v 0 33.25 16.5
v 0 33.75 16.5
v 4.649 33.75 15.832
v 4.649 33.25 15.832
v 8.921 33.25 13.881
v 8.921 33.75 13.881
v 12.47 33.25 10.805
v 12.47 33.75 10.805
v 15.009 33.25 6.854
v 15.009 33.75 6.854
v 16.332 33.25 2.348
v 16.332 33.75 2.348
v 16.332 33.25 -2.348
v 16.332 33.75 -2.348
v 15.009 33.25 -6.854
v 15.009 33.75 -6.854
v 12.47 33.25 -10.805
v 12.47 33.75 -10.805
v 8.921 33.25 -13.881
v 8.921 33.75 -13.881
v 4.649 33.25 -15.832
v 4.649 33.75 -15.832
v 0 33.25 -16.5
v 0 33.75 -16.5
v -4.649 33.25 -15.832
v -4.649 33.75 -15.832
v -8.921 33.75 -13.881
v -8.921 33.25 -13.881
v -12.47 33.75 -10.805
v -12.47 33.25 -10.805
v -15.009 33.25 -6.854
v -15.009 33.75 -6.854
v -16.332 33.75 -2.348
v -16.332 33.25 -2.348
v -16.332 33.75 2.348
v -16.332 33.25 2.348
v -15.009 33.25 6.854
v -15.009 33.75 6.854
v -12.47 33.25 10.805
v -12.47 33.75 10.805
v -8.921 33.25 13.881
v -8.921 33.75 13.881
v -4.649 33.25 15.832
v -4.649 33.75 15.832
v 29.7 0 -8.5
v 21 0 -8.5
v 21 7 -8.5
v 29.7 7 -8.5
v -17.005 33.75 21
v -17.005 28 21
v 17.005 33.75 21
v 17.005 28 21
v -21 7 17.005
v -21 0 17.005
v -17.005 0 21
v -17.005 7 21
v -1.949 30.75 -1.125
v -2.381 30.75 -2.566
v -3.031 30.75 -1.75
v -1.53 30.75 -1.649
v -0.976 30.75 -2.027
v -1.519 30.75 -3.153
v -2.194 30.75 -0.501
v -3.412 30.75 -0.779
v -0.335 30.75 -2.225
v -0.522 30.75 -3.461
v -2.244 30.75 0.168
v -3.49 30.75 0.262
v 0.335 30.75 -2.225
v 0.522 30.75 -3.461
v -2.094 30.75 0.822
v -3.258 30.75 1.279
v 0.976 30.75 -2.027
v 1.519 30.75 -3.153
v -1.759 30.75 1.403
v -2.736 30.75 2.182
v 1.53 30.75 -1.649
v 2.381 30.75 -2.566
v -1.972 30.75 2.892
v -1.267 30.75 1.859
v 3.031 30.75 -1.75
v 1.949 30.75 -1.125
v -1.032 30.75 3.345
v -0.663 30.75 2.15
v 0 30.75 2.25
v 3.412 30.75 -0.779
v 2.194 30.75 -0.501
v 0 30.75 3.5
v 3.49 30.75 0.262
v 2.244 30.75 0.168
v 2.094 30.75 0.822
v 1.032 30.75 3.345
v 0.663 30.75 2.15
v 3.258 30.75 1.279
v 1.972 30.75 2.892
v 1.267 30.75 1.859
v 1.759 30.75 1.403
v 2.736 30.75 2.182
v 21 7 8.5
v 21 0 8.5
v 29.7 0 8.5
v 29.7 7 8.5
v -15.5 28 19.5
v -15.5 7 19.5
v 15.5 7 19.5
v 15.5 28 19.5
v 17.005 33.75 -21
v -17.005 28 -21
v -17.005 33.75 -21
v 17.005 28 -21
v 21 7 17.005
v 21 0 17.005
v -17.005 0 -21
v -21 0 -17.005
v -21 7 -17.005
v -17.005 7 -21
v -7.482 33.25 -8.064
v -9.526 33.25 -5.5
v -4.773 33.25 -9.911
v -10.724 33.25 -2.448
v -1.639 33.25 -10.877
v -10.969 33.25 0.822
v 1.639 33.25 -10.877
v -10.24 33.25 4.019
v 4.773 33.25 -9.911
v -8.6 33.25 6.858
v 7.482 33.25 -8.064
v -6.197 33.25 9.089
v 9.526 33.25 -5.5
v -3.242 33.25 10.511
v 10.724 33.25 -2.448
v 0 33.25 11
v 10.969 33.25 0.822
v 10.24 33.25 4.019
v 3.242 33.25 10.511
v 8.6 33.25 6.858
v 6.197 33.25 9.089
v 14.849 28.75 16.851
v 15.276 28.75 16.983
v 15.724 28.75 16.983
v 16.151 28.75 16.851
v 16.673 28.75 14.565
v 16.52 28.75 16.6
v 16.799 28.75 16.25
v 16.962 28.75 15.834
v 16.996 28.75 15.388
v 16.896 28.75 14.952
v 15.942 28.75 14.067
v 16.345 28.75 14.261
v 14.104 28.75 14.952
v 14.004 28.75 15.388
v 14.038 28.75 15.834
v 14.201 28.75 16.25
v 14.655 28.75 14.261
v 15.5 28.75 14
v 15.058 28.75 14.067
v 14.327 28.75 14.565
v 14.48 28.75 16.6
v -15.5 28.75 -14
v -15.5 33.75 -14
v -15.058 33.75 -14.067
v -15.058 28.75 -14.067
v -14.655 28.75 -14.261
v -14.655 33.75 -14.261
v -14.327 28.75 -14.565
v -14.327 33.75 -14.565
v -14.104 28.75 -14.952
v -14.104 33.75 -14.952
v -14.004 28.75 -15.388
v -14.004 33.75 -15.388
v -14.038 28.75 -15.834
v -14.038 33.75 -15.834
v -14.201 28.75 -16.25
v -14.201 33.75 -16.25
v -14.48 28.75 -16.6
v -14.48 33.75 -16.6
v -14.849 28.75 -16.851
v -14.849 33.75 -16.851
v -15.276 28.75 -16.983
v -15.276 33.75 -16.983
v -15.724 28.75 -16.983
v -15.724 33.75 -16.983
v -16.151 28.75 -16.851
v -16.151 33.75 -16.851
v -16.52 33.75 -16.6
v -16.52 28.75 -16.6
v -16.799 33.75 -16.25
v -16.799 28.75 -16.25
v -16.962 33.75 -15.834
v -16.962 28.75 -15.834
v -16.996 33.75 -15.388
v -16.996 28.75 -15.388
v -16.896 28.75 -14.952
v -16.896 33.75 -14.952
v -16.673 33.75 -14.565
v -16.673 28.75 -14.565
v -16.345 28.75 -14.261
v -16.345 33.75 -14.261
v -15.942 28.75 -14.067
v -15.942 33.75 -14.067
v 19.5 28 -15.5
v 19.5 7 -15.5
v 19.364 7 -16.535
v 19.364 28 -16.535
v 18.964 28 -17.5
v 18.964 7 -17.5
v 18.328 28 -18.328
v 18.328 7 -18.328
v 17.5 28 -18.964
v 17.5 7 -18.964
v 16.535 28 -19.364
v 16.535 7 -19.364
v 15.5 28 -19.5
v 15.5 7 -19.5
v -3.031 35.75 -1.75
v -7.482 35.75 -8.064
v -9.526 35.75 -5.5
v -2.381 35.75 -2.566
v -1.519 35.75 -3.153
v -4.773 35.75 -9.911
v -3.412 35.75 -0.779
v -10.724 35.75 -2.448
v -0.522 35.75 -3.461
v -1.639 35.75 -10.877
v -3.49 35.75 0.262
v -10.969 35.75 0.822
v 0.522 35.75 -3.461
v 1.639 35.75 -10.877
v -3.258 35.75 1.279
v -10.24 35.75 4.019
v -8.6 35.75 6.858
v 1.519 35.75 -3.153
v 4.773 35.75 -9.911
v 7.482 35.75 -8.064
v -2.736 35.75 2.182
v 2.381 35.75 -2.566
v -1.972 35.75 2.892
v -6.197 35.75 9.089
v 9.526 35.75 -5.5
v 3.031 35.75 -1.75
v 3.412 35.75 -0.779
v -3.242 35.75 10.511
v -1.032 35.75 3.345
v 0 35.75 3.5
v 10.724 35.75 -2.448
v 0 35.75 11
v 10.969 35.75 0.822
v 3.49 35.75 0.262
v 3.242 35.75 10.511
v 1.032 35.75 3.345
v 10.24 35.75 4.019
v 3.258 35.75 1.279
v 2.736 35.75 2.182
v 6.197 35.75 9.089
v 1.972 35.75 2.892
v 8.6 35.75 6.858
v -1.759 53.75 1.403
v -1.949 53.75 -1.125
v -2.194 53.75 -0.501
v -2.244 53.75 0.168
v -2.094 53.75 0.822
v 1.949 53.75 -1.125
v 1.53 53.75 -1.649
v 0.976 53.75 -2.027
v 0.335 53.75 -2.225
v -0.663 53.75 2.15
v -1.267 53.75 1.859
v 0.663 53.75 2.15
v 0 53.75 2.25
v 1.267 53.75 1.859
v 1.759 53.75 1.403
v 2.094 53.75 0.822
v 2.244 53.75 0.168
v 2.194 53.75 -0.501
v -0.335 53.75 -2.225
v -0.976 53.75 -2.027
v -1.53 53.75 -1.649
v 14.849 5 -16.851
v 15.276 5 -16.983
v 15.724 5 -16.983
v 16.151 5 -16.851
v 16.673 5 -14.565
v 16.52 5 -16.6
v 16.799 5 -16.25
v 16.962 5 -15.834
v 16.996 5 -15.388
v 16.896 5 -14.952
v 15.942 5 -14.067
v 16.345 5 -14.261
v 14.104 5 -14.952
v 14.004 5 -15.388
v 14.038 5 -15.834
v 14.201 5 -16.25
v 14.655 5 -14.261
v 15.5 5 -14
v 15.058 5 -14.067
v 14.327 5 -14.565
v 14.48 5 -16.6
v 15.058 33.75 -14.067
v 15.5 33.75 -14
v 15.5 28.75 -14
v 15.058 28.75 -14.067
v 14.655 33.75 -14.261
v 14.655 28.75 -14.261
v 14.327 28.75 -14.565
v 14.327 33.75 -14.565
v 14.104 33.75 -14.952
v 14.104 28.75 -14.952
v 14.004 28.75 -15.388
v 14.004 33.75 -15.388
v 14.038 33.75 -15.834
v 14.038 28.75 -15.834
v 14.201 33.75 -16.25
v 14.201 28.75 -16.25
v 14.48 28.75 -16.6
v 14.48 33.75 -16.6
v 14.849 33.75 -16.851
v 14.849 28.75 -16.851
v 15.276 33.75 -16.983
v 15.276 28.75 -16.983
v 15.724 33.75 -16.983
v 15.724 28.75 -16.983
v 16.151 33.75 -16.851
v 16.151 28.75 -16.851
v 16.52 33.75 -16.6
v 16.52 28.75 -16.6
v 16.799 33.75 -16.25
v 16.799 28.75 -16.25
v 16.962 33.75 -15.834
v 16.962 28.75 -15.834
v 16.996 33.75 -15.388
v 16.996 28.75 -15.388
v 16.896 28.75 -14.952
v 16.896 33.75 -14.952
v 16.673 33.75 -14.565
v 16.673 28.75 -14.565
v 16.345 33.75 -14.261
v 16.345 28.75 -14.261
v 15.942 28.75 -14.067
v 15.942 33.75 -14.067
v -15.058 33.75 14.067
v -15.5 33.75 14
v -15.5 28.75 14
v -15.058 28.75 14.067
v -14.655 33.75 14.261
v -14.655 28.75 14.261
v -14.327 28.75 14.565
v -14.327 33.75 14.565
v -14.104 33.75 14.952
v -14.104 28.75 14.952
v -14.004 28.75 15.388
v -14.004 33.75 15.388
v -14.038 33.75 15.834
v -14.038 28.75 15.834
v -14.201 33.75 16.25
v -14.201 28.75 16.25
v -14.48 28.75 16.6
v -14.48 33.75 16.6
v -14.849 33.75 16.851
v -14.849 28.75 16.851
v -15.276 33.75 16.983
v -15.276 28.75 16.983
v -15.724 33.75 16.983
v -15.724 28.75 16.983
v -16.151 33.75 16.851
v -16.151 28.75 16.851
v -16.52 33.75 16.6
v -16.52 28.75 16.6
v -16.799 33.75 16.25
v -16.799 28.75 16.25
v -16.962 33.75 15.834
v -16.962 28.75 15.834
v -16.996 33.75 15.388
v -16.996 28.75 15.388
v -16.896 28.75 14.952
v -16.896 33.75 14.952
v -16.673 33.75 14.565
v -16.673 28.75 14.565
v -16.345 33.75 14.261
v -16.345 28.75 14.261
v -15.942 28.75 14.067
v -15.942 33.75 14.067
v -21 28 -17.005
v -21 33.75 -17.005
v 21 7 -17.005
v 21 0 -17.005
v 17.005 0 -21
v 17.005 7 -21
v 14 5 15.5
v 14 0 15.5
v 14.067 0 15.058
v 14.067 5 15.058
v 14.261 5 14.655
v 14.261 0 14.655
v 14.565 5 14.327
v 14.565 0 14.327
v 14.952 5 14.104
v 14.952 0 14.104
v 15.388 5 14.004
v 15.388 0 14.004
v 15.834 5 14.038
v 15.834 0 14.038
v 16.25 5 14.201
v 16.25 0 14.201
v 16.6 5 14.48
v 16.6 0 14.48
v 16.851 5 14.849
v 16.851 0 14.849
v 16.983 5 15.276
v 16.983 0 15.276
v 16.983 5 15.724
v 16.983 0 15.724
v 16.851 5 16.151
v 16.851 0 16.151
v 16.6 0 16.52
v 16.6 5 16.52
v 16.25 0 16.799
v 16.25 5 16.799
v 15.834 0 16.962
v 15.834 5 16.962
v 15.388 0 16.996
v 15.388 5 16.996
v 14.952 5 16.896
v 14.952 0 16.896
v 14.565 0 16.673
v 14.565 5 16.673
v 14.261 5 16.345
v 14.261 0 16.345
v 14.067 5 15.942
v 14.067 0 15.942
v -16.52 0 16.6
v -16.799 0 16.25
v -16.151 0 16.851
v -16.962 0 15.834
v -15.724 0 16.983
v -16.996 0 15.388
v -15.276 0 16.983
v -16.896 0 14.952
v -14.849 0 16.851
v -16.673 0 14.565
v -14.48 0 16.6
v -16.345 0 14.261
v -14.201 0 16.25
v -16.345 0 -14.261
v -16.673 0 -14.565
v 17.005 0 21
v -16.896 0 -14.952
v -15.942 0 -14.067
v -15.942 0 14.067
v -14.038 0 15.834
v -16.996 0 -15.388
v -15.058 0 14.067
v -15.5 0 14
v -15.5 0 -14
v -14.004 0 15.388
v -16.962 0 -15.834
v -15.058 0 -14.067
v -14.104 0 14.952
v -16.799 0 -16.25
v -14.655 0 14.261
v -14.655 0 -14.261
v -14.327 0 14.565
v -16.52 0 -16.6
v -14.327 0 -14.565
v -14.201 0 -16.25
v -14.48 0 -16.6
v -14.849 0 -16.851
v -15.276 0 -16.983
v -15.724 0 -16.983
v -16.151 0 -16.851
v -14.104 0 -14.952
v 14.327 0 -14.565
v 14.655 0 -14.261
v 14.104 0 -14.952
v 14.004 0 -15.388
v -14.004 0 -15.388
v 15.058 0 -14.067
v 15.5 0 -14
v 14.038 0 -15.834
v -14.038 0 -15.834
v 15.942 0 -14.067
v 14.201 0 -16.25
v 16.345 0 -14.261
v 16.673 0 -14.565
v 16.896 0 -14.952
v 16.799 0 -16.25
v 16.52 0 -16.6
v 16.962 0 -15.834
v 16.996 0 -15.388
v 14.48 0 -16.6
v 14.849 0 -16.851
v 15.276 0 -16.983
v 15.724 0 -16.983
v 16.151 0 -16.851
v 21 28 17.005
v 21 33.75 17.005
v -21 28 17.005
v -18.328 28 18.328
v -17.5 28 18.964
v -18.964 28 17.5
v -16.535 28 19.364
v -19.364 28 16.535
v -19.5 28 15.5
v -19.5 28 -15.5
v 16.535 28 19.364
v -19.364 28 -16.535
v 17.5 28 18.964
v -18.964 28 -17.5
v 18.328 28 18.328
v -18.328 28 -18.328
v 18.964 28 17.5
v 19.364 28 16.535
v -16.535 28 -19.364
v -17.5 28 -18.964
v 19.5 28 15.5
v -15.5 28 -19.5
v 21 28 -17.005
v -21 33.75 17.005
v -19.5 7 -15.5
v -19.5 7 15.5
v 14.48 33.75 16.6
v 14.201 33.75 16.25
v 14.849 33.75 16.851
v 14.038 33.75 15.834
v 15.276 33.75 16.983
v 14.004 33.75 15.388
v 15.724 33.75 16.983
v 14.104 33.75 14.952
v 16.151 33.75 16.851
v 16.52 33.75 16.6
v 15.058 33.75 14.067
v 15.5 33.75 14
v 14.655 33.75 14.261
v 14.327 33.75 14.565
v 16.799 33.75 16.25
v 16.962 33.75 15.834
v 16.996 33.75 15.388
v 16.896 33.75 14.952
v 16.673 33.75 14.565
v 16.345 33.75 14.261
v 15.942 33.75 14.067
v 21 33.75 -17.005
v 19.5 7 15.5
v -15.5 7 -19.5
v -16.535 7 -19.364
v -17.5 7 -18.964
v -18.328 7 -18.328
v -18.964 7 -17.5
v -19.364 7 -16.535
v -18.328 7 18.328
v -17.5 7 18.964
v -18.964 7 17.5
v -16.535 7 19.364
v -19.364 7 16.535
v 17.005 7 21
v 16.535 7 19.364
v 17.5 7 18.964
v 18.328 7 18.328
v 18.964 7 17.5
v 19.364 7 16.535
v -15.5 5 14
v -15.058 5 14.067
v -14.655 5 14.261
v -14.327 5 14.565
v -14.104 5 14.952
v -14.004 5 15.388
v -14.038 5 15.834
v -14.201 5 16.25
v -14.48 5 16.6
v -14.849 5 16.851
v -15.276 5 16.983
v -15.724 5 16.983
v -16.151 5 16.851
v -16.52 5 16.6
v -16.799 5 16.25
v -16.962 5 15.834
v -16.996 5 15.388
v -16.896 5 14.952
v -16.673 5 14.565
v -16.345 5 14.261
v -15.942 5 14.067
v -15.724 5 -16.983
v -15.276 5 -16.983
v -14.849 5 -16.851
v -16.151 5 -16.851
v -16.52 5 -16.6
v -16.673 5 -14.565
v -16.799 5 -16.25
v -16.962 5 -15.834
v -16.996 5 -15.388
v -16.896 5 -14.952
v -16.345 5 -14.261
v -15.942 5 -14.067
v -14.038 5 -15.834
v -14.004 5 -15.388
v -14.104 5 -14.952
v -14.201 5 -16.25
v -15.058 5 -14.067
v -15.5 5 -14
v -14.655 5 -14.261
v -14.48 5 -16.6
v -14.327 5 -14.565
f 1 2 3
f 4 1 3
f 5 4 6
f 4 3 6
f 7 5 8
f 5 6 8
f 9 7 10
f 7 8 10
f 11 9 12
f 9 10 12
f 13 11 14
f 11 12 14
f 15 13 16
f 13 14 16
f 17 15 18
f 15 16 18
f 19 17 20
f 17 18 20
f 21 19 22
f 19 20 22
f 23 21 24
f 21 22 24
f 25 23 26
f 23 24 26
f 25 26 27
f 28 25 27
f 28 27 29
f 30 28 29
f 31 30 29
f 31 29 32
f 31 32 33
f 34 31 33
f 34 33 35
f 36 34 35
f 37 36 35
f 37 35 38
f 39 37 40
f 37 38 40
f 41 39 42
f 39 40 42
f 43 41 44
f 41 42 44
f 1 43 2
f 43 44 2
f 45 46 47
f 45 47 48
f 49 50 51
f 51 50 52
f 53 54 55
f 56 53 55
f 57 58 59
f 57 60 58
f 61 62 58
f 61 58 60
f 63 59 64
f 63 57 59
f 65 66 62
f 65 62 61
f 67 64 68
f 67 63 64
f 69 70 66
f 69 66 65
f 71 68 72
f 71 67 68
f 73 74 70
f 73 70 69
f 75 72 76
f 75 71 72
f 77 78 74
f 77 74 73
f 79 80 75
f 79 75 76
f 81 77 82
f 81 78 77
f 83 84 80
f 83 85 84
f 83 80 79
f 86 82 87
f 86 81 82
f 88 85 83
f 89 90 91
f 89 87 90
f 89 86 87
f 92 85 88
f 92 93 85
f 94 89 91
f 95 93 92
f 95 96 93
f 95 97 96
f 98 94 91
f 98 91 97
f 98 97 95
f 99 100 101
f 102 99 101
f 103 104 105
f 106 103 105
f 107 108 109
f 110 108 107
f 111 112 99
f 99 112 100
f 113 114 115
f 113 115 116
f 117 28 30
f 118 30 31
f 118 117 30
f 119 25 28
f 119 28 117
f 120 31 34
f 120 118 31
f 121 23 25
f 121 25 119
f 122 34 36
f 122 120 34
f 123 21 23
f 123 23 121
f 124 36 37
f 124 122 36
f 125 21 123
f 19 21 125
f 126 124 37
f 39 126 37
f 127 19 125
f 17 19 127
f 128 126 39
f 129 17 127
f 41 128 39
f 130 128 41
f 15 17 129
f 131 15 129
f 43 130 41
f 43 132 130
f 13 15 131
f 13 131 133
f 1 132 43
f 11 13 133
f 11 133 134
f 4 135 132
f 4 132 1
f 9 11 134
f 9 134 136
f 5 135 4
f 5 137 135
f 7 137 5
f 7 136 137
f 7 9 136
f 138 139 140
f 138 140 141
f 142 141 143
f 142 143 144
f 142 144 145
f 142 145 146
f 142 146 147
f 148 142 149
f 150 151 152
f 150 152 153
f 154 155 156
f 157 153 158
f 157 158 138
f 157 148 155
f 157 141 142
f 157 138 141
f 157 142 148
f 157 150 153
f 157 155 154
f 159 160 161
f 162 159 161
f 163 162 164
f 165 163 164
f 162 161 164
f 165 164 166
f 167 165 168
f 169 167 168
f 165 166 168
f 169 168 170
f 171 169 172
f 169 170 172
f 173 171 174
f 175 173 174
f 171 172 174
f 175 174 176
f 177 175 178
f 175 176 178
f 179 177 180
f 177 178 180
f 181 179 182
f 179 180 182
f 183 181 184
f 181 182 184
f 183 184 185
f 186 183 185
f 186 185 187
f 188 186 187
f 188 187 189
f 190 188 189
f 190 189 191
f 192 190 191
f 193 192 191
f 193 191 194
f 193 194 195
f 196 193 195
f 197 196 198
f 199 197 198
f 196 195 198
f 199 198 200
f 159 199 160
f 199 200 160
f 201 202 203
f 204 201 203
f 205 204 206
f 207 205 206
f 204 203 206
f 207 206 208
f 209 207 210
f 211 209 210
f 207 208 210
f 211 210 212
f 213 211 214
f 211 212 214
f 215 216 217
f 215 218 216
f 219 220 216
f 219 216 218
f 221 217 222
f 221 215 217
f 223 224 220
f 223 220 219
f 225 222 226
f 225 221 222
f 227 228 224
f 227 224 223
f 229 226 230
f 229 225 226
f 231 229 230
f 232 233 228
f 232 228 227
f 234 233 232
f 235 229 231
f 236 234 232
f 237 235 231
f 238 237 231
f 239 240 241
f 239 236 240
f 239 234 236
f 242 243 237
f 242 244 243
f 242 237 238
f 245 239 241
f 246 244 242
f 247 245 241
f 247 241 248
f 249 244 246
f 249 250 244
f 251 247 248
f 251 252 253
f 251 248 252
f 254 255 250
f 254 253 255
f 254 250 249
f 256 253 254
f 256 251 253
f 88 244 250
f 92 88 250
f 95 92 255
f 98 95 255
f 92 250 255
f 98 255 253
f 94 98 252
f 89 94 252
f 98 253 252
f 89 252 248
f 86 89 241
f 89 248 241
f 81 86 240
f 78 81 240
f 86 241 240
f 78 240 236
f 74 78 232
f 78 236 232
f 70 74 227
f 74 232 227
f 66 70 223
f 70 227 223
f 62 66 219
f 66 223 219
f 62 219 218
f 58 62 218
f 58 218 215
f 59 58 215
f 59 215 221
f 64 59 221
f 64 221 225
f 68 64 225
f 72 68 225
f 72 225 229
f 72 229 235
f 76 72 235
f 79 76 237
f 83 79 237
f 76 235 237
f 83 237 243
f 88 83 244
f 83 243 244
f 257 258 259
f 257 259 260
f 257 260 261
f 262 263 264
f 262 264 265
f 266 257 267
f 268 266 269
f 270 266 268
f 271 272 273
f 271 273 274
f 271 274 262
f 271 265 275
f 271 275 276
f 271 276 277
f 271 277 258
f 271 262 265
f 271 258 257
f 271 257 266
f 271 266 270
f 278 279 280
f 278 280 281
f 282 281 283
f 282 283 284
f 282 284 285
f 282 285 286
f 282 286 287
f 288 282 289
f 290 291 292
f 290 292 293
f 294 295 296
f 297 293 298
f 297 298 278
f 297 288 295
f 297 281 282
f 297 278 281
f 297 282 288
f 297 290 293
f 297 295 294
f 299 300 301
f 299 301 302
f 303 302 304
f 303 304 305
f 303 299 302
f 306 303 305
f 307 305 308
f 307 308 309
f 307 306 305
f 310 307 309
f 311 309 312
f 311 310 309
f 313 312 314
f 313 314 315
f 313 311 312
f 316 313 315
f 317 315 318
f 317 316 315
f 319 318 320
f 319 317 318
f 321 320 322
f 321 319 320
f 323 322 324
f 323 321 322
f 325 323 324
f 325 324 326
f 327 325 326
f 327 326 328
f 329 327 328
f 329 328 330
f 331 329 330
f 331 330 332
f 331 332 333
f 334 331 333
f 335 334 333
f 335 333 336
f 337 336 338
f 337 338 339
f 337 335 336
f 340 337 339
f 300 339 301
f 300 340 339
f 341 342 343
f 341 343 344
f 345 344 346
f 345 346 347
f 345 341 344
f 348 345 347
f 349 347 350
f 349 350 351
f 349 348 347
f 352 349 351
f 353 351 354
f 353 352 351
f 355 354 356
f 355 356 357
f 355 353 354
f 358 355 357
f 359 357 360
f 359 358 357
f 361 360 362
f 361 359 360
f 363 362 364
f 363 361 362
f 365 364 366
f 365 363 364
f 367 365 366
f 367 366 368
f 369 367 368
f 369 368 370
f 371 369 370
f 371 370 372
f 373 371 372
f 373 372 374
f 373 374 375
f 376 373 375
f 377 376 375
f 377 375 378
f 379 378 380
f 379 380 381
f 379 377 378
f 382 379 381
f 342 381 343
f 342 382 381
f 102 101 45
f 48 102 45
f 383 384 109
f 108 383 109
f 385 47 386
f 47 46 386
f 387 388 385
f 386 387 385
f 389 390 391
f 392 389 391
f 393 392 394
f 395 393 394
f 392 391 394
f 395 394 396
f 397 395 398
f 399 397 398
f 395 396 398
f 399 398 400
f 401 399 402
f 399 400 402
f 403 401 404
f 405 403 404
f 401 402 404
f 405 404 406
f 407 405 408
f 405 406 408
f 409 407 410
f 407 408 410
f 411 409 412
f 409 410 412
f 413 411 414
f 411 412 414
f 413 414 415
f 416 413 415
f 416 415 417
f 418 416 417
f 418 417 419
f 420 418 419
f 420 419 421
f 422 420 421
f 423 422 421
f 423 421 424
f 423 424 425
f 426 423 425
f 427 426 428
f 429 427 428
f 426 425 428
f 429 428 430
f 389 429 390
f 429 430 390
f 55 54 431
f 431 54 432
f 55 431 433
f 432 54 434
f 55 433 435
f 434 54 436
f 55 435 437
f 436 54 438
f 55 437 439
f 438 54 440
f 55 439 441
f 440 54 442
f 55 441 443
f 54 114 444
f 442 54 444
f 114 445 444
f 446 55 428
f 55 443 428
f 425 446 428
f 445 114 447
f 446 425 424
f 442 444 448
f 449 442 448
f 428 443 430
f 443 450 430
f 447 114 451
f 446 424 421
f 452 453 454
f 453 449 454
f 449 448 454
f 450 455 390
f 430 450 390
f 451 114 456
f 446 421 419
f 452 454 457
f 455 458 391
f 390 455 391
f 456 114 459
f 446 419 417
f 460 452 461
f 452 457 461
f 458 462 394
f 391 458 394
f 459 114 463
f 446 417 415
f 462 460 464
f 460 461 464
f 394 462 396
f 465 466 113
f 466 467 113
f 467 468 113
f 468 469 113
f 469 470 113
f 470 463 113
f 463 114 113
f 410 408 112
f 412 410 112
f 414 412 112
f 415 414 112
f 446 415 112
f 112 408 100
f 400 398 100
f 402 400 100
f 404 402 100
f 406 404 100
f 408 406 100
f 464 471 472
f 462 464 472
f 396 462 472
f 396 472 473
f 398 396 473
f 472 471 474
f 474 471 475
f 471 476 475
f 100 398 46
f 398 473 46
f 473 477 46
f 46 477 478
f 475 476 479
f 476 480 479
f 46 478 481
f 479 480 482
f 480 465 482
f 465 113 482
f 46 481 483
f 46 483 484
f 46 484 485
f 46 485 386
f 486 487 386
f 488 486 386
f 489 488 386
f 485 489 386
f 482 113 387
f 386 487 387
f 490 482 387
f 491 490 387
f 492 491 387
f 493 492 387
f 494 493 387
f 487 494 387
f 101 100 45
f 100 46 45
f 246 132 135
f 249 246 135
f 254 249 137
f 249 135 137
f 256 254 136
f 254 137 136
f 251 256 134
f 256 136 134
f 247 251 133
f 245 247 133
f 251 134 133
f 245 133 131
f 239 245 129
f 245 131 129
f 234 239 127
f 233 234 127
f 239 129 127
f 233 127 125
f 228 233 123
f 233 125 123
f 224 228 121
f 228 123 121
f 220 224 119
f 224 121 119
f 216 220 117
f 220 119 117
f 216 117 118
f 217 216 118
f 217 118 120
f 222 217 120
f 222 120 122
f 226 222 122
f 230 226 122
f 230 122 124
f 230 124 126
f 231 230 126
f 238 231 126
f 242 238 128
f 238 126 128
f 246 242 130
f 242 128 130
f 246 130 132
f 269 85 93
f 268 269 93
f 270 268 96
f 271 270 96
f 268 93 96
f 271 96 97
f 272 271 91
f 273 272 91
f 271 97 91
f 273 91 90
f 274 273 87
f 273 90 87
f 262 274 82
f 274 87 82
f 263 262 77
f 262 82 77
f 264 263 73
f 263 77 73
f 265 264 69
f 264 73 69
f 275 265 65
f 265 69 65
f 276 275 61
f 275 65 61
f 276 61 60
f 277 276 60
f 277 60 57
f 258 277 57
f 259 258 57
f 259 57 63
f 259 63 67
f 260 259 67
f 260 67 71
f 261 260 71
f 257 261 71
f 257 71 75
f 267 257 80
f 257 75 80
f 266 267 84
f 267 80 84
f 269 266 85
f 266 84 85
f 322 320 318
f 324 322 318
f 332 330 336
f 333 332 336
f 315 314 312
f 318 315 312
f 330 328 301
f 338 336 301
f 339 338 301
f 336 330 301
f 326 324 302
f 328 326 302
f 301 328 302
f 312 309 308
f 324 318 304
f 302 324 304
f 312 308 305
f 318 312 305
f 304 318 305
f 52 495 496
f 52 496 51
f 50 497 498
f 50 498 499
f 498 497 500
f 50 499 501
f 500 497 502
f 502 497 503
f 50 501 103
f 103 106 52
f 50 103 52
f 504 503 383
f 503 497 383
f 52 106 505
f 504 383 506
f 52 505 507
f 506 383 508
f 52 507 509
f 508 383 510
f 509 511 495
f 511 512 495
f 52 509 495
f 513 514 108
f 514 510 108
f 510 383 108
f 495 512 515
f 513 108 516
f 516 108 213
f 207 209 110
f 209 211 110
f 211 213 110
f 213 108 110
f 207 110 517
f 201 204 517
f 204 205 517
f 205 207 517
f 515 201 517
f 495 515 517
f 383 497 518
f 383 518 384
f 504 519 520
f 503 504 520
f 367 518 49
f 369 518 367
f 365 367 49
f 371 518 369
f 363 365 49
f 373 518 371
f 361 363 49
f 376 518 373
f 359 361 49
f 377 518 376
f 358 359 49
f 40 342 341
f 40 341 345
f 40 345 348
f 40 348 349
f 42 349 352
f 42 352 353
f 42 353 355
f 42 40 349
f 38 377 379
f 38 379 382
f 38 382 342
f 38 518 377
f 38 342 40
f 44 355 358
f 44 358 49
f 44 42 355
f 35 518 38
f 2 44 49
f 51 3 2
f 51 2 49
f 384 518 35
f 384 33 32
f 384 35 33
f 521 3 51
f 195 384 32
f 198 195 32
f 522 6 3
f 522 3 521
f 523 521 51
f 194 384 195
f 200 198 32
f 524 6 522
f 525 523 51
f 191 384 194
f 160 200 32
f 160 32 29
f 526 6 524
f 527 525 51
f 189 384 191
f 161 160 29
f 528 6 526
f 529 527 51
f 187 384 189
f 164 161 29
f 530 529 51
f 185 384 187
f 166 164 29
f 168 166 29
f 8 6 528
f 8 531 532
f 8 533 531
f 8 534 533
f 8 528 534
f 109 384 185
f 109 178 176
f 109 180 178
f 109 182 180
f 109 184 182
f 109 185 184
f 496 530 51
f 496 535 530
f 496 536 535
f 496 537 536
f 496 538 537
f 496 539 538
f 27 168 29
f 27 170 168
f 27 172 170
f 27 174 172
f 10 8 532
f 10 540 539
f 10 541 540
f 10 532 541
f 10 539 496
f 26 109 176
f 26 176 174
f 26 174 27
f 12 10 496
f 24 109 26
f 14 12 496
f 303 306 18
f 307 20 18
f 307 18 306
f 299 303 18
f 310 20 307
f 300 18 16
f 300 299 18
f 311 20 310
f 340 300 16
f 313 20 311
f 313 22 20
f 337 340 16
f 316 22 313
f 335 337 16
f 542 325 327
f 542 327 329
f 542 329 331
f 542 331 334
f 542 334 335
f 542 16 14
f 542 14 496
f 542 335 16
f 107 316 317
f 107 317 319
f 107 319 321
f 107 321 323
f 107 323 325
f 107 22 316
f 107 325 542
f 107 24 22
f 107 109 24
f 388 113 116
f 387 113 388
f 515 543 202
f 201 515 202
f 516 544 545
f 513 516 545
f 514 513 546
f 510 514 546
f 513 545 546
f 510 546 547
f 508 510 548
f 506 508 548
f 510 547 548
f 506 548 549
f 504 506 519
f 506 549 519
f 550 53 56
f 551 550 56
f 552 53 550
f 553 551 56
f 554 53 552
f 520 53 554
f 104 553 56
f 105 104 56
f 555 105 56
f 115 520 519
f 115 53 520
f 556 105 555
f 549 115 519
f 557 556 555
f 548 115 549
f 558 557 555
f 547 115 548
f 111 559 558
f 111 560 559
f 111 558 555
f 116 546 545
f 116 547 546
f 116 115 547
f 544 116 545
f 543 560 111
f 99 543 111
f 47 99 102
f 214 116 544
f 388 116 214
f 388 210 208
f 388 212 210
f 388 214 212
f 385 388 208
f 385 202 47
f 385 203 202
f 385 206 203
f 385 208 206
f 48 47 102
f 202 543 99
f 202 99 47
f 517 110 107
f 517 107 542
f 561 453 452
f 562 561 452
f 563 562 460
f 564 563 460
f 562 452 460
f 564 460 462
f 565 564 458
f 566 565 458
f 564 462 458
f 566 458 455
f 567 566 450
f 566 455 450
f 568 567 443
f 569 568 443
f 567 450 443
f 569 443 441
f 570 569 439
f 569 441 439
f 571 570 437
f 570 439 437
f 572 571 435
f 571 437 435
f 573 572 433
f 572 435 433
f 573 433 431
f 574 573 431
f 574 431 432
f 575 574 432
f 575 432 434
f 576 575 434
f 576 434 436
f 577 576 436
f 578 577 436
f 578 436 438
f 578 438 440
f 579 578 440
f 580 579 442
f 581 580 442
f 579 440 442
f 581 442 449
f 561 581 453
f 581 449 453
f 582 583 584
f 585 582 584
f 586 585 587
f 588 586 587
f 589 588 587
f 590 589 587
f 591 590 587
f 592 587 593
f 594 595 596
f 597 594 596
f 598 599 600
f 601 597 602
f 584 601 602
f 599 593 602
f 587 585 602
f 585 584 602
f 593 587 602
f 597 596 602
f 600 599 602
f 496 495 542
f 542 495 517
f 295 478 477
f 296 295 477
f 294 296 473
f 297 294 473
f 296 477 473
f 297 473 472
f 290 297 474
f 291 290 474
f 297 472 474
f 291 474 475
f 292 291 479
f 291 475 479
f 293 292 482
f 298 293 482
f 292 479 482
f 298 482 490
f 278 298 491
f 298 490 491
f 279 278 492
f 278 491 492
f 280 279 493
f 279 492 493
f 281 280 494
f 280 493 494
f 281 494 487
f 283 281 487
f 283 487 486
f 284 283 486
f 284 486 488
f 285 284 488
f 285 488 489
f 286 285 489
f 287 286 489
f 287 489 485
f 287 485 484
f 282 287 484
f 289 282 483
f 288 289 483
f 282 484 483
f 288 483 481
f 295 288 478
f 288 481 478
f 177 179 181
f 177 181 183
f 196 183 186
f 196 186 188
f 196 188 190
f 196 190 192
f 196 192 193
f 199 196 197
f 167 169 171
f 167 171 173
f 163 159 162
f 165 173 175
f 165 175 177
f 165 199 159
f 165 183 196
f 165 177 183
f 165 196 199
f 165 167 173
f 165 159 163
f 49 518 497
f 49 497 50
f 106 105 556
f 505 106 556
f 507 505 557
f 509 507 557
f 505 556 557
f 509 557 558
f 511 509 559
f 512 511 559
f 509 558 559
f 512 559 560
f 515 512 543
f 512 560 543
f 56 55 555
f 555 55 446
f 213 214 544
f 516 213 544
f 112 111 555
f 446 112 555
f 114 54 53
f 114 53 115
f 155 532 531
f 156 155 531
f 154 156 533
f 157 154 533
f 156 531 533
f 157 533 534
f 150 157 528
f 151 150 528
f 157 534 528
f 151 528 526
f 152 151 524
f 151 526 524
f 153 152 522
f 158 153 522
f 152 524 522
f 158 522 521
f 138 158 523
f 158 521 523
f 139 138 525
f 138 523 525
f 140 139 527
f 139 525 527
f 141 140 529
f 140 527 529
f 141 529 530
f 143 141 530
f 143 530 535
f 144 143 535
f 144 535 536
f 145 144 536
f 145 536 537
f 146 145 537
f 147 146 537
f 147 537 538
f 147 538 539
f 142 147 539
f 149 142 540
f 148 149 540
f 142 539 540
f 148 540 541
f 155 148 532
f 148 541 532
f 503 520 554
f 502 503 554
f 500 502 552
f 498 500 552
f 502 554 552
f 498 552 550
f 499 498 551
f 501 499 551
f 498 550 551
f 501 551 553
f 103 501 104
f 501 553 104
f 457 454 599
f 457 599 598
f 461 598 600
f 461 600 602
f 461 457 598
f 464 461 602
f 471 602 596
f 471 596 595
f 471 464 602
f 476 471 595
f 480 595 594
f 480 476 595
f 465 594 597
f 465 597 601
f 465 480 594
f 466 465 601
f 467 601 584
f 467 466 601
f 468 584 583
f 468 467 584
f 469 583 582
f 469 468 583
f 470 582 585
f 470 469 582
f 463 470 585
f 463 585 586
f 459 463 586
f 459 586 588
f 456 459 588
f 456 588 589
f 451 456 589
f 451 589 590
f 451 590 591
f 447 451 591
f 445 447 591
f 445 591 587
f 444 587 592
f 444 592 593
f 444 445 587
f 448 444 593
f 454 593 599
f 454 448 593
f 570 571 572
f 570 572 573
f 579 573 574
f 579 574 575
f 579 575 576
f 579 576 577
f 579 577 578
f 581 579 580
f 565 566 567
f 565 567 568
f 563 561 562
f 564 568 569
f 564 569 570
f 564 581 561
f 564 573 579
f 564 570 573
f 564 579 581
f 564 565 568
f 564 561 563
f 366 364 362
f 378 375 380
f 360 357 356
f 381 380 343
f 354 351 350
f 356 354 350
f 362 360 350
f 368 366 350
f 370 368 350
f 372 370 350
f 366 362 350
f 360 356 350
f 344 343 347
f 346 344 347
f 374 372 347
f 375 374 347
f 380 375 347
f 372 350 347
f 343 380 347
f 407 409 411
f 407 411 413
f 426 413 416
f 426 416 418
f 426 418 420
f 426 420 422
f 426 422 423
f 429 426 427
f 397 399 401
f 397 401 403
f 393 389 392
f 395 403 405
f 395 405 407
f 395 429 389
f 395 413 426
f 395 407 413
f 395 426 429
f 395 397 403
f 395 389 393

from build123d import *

# Parameters (mm, degrees)
SKETCH2_W                   = 42
SKETCH2_H                   = 42
MAIN_BOSS_DEPTH             = 33.75
SKETCH4_W                   = 8.7
SKETCH4_H                   = 17
SIDE_EXTRUDE_DEPTH          = 10
SKETCH5_R                   = 16.5
BIG_CIRCLE_CUT_DEPTH        = 0.5
SKETCH6_R                   = 11
MEDIUM_CIRCLE_EXTRUDE_DEPTH = 2.5
SKETCH7_R                   = 3.5
SMALL_CIRCLE_CUT_DEPTH      = 5
SKETCH8_R                   = 2.25
CIRCULAR_TALL_EXTRUDE_DEPTH = 23
SIDE_EDGE_CUT_DEPTH         = 50.62008162
MIRROR2_DEPTH               = 33.75
SKETCH10_R                  = 1.5
F_4_HOLES_DEPTH             = 5
MIRROR4_COPY_1_SKETCH_R     = 1.5
MIRROR4_COPY_1_DEPTH        = 5
MIRROR6_COPY_1_SKETCH_R     = 1.5
MIRROR6_COPY_1_DEPTH        = 5
MIRROR6_COPY_2_SKETCH_R     = 1.5
MIRROR6_COPY_2_DEPTH        = 5
MIRROR6_COPY_3_SKETCH_R     = 1.5
MIRROR6_COPY_3_DEPTH        = 5
SKETCH12_OUTSIDE_W          = 69.698
SKETCH12_OUTSIDE_H          = 60.998
CUT_AROUND_BODY_DEPTH       = 21


# Read off the part's stored shape, not the designer's step: Mirror2
with BuildPart() as part:
    # Sketch2 → Main Boss (new body)
    with BuildSketch(Plane(origin=(0, 0, 0), x_dir=(1, 0, 0), z_dir=(0, 1, 0))):
        Rectangle(SKETCH2_W, SKETCH2_H)
    extrude(amount=MAIN_BOSS_DEPTH)

    # Sketch4 → side extrude (add)
    with BuildSketch(Plane(origin=(0, 0, 0), x_dir=(1, 0, 0), z_dir=(0, 1, 0))):
        with Locations((25.35, 0)):
            Rectangle(SKETCH4_W, SKETCH4_H)
    extrude(amount=SIDE_EXTRUDE_DEPTH)

    # Sketch5 → Big circle cut (cut)
    with BuildSketch(Plane(origin=(0, 33.75, 0), x_dir=(1, 0, 0), z_dir=(0, 1, 0))):
        with Locations(Location((0, 0, 0), (0, 0, 270))):
            Circle(SKETCH5_R)
    extrude(amount=-BIG_CIRCLE_CUT_DEPTH, mode=Mode.SUBTRACT)

    # Sketch6 → medium circle extrude (add)
    with BuildSketch(Plane(origin=(0, 33.25, 0), x_dir=(1, 0, 0), z_dir=(0, 1, 0))):
        with Locations(Location((0, 0, 0), (0, 0, 270))):
            Circle(SKETCH6_R)
    extrude(amount=MEDIUM_CIRCLE_EXTRUDE_DEPTH)

    # Sketch7 → small circle cut (cut)
    with BuildSketch(Plane(origin=(0, 35.75, 0), x_dir=(1, 0, 0), z_dir=(0, 1, 0))):
        with Locations(Location((0, 0, 0), (0, 0, 270))):
            Circle(SKETCH7_R)
    extrude(amount=-SMALL_CIRCLE_CUT_DEPTH, mode=Mode.SUBTRACT)

    # Sketch8 → circular tall extrude (add)
    with BuildSketch(Plane(origin=(0, 30.75, 0), x_dir=(1, 0, 0), z_dir=(0, 1, 0))):
        with Locations(Location((0, 0, 0), (0, 0, 270))):
            Circle(SKETCH8_R)
    extrude(amount=CIRCULAR_TALL_EXTRUDE_DEPTH)

    # Sketch9 → side edge cut (cut, symmetric)
    with BuildSketch(Plane(origin=(0, 33.75, 0), x_dir=(1, 0, 0), z_dir=(0, 1, 0))):
        Polygon((79.674907888, 117.679754574), (-17.004846686, 21), (-21, 17.004846686), (-117.679754574, -79.674907888), (-311.039263723, 113.684601261), (-113.684601261, 311.039263723), align=None)
    side_edge_cut = extrude(amount=SIDE_EDGE_CUT_DEPTH, both=True, mode=Mode.SUBTRACT)

    # Mirror1: side edge cut across plane
    add(side_edge_cut.mirror(Plane.XY), mode=Mode.SUBTRACT)

    # Mirror2 outline → Mirror2 (cut)
    with BuildSketch(Plane(origin=(0, 0, 0), x_dir=(1, 0, 0), z_dir=(0, 1, 0))):
        Polygon((21, -21), (21, -17.004846686), (17.004846686, -21), align=None)
        Polygon((17.004846686, 21), (21, 17.004846686), (21, 21), align=None)
    extrude(amount=MIRROR2_DEPTH, mode=Mode.SUBTRACT)

    # Sketch10 → 4 holes (cut)
    with BuildSketch(Plane(origin=(0, 33.75, 0), x_dir=(1, 0, 0), z_dir=(0, 1, 0))):
        with Locations(Location((-15.5, 15.5, 0), (0, 0, 270))):
            Circle(SKETCH10_R)
    f_4_holes = extrude(amount=-F_4_HOLES_DEPTH, mode=Mode.SUBTRACT)

    # Mirror3: 4 holes across plane
    add(f_4_holes.mirror(Plane.XY), mode=Mode.SUBTRACT)

    # Mirror4: 4 holes across plane
    add(f_4_holes.mirror(Plane(origin=(0, 0, 0), x_dir=(0, 0, 1), z_dir=(1, 0, 0))), mode=Mode.SUBTRACT)

    # Mirror4 copy 1 sketch → Mirror4 copy 1 (cut)
    with BuildSketch(Plane(origin=(0, 33.75, 0), x_dir=(-1, 0, 0), z_dir=(0, 1, 0))):
        with Locations(Location((-15.5, 15.5, 0), (0, 0, 270))):
            Circle(MIRROR4_COPY_1_SKETCH_R)
    extrude(amount=-MIRROR4_COPY_1_DEPTH, mode=Mode.SUBTRACT)

    # Mirror6: 4 holes across plane
    add(f_4_holes.mirror(Plane.ZX.offset(16.875)), mode=Mode.SUBTRACT)

    # Mirror6 copy 1 sketch → Mirror6 copy 1 (cut)
    with BuildSketch(Plane.XZ):
        with Locations(Location((-15.5, 15.5, 0), (0, 0, 270))):
            Circle(MIRROR6_COPY_1_SKETCH_R)
    extrude(amount=-MIRROR6_COPY_1_DEPTH, mode=Mode.SUBTRACT)

    # Mirror6 copy 2 sketch → Mirror6 copy 2 (cut)
    with BuildSketch(Plane(origin=(0, 0, 0), x_dir=(-1, 0, 0), z_dir=(0, -1, 0))):
        with Locations(Location((-15.5, 15.5, 0), (0, 0, 270))):
            Circle(MIRROR6_COPY_2_SKETCH_R)
    extrude(amount=-MIRROR6_COPY_2_DEPTH, mode=Mode.SUBTRACT)

    # Mirror6 copy 3 sketch → Mirror6 copy 3 (cut)
    with BuildSketch(Plane(origin=(0, 0, 0), x_dir=(-1, 0, 0), z_dir=(0, -1, 0))):
        with Locations((-15.5, -15.5)):
            Circle(MIRROR6_COPY_3_SKETCH_R)
    extrude(amount=-MIRROR6_COPY_3_DEPTH, mode=Mode.SUBTRACT)

    # Sketch12 outside → cut around body (cut)
    with BuildSketch(Plane(origin=(0, 7, 0), x_dir=(1, 0, 0), z_dir=(0, 1, 0))):
        with Locations((4.35, 0)):
            Rectangle(SKETCH12_OUTSIDE_W, SKETCH12_OUTSIDE_H)
        with BuildLine():
            Line((-15.5, -19.5), (15.5, -19.5))
            ThreePointArc((15.5, -19.5), (18.328427125, -18.328427125), (19.5, -15.5))
            Line((19.5, -15.5), (19.5, 15.5))
            ThreePointArc((19.5, 15.5), (18.328427125, 18.328427125), (15.5, 19.5))
            Line((15.5, 19.5), (-15.5, 19.5))
            ThreePointArc((-15.5, 19.5), (-18.328427125, 18.328427125), (-19.5, 15.5))
            Line((-19.5, 15.5), (-19.5, -15.5))
            ThreePointArc((-19.5, -15.5), (-18.328427125, -18.328427125), (-15.5, -19.5))
        make_face(mode=Mode.SUBTRACT)
    extrude(amount=CUT_AROUND_BODY_DEPTH, mode=Mode.SUBTRACT)


solid = part.part
